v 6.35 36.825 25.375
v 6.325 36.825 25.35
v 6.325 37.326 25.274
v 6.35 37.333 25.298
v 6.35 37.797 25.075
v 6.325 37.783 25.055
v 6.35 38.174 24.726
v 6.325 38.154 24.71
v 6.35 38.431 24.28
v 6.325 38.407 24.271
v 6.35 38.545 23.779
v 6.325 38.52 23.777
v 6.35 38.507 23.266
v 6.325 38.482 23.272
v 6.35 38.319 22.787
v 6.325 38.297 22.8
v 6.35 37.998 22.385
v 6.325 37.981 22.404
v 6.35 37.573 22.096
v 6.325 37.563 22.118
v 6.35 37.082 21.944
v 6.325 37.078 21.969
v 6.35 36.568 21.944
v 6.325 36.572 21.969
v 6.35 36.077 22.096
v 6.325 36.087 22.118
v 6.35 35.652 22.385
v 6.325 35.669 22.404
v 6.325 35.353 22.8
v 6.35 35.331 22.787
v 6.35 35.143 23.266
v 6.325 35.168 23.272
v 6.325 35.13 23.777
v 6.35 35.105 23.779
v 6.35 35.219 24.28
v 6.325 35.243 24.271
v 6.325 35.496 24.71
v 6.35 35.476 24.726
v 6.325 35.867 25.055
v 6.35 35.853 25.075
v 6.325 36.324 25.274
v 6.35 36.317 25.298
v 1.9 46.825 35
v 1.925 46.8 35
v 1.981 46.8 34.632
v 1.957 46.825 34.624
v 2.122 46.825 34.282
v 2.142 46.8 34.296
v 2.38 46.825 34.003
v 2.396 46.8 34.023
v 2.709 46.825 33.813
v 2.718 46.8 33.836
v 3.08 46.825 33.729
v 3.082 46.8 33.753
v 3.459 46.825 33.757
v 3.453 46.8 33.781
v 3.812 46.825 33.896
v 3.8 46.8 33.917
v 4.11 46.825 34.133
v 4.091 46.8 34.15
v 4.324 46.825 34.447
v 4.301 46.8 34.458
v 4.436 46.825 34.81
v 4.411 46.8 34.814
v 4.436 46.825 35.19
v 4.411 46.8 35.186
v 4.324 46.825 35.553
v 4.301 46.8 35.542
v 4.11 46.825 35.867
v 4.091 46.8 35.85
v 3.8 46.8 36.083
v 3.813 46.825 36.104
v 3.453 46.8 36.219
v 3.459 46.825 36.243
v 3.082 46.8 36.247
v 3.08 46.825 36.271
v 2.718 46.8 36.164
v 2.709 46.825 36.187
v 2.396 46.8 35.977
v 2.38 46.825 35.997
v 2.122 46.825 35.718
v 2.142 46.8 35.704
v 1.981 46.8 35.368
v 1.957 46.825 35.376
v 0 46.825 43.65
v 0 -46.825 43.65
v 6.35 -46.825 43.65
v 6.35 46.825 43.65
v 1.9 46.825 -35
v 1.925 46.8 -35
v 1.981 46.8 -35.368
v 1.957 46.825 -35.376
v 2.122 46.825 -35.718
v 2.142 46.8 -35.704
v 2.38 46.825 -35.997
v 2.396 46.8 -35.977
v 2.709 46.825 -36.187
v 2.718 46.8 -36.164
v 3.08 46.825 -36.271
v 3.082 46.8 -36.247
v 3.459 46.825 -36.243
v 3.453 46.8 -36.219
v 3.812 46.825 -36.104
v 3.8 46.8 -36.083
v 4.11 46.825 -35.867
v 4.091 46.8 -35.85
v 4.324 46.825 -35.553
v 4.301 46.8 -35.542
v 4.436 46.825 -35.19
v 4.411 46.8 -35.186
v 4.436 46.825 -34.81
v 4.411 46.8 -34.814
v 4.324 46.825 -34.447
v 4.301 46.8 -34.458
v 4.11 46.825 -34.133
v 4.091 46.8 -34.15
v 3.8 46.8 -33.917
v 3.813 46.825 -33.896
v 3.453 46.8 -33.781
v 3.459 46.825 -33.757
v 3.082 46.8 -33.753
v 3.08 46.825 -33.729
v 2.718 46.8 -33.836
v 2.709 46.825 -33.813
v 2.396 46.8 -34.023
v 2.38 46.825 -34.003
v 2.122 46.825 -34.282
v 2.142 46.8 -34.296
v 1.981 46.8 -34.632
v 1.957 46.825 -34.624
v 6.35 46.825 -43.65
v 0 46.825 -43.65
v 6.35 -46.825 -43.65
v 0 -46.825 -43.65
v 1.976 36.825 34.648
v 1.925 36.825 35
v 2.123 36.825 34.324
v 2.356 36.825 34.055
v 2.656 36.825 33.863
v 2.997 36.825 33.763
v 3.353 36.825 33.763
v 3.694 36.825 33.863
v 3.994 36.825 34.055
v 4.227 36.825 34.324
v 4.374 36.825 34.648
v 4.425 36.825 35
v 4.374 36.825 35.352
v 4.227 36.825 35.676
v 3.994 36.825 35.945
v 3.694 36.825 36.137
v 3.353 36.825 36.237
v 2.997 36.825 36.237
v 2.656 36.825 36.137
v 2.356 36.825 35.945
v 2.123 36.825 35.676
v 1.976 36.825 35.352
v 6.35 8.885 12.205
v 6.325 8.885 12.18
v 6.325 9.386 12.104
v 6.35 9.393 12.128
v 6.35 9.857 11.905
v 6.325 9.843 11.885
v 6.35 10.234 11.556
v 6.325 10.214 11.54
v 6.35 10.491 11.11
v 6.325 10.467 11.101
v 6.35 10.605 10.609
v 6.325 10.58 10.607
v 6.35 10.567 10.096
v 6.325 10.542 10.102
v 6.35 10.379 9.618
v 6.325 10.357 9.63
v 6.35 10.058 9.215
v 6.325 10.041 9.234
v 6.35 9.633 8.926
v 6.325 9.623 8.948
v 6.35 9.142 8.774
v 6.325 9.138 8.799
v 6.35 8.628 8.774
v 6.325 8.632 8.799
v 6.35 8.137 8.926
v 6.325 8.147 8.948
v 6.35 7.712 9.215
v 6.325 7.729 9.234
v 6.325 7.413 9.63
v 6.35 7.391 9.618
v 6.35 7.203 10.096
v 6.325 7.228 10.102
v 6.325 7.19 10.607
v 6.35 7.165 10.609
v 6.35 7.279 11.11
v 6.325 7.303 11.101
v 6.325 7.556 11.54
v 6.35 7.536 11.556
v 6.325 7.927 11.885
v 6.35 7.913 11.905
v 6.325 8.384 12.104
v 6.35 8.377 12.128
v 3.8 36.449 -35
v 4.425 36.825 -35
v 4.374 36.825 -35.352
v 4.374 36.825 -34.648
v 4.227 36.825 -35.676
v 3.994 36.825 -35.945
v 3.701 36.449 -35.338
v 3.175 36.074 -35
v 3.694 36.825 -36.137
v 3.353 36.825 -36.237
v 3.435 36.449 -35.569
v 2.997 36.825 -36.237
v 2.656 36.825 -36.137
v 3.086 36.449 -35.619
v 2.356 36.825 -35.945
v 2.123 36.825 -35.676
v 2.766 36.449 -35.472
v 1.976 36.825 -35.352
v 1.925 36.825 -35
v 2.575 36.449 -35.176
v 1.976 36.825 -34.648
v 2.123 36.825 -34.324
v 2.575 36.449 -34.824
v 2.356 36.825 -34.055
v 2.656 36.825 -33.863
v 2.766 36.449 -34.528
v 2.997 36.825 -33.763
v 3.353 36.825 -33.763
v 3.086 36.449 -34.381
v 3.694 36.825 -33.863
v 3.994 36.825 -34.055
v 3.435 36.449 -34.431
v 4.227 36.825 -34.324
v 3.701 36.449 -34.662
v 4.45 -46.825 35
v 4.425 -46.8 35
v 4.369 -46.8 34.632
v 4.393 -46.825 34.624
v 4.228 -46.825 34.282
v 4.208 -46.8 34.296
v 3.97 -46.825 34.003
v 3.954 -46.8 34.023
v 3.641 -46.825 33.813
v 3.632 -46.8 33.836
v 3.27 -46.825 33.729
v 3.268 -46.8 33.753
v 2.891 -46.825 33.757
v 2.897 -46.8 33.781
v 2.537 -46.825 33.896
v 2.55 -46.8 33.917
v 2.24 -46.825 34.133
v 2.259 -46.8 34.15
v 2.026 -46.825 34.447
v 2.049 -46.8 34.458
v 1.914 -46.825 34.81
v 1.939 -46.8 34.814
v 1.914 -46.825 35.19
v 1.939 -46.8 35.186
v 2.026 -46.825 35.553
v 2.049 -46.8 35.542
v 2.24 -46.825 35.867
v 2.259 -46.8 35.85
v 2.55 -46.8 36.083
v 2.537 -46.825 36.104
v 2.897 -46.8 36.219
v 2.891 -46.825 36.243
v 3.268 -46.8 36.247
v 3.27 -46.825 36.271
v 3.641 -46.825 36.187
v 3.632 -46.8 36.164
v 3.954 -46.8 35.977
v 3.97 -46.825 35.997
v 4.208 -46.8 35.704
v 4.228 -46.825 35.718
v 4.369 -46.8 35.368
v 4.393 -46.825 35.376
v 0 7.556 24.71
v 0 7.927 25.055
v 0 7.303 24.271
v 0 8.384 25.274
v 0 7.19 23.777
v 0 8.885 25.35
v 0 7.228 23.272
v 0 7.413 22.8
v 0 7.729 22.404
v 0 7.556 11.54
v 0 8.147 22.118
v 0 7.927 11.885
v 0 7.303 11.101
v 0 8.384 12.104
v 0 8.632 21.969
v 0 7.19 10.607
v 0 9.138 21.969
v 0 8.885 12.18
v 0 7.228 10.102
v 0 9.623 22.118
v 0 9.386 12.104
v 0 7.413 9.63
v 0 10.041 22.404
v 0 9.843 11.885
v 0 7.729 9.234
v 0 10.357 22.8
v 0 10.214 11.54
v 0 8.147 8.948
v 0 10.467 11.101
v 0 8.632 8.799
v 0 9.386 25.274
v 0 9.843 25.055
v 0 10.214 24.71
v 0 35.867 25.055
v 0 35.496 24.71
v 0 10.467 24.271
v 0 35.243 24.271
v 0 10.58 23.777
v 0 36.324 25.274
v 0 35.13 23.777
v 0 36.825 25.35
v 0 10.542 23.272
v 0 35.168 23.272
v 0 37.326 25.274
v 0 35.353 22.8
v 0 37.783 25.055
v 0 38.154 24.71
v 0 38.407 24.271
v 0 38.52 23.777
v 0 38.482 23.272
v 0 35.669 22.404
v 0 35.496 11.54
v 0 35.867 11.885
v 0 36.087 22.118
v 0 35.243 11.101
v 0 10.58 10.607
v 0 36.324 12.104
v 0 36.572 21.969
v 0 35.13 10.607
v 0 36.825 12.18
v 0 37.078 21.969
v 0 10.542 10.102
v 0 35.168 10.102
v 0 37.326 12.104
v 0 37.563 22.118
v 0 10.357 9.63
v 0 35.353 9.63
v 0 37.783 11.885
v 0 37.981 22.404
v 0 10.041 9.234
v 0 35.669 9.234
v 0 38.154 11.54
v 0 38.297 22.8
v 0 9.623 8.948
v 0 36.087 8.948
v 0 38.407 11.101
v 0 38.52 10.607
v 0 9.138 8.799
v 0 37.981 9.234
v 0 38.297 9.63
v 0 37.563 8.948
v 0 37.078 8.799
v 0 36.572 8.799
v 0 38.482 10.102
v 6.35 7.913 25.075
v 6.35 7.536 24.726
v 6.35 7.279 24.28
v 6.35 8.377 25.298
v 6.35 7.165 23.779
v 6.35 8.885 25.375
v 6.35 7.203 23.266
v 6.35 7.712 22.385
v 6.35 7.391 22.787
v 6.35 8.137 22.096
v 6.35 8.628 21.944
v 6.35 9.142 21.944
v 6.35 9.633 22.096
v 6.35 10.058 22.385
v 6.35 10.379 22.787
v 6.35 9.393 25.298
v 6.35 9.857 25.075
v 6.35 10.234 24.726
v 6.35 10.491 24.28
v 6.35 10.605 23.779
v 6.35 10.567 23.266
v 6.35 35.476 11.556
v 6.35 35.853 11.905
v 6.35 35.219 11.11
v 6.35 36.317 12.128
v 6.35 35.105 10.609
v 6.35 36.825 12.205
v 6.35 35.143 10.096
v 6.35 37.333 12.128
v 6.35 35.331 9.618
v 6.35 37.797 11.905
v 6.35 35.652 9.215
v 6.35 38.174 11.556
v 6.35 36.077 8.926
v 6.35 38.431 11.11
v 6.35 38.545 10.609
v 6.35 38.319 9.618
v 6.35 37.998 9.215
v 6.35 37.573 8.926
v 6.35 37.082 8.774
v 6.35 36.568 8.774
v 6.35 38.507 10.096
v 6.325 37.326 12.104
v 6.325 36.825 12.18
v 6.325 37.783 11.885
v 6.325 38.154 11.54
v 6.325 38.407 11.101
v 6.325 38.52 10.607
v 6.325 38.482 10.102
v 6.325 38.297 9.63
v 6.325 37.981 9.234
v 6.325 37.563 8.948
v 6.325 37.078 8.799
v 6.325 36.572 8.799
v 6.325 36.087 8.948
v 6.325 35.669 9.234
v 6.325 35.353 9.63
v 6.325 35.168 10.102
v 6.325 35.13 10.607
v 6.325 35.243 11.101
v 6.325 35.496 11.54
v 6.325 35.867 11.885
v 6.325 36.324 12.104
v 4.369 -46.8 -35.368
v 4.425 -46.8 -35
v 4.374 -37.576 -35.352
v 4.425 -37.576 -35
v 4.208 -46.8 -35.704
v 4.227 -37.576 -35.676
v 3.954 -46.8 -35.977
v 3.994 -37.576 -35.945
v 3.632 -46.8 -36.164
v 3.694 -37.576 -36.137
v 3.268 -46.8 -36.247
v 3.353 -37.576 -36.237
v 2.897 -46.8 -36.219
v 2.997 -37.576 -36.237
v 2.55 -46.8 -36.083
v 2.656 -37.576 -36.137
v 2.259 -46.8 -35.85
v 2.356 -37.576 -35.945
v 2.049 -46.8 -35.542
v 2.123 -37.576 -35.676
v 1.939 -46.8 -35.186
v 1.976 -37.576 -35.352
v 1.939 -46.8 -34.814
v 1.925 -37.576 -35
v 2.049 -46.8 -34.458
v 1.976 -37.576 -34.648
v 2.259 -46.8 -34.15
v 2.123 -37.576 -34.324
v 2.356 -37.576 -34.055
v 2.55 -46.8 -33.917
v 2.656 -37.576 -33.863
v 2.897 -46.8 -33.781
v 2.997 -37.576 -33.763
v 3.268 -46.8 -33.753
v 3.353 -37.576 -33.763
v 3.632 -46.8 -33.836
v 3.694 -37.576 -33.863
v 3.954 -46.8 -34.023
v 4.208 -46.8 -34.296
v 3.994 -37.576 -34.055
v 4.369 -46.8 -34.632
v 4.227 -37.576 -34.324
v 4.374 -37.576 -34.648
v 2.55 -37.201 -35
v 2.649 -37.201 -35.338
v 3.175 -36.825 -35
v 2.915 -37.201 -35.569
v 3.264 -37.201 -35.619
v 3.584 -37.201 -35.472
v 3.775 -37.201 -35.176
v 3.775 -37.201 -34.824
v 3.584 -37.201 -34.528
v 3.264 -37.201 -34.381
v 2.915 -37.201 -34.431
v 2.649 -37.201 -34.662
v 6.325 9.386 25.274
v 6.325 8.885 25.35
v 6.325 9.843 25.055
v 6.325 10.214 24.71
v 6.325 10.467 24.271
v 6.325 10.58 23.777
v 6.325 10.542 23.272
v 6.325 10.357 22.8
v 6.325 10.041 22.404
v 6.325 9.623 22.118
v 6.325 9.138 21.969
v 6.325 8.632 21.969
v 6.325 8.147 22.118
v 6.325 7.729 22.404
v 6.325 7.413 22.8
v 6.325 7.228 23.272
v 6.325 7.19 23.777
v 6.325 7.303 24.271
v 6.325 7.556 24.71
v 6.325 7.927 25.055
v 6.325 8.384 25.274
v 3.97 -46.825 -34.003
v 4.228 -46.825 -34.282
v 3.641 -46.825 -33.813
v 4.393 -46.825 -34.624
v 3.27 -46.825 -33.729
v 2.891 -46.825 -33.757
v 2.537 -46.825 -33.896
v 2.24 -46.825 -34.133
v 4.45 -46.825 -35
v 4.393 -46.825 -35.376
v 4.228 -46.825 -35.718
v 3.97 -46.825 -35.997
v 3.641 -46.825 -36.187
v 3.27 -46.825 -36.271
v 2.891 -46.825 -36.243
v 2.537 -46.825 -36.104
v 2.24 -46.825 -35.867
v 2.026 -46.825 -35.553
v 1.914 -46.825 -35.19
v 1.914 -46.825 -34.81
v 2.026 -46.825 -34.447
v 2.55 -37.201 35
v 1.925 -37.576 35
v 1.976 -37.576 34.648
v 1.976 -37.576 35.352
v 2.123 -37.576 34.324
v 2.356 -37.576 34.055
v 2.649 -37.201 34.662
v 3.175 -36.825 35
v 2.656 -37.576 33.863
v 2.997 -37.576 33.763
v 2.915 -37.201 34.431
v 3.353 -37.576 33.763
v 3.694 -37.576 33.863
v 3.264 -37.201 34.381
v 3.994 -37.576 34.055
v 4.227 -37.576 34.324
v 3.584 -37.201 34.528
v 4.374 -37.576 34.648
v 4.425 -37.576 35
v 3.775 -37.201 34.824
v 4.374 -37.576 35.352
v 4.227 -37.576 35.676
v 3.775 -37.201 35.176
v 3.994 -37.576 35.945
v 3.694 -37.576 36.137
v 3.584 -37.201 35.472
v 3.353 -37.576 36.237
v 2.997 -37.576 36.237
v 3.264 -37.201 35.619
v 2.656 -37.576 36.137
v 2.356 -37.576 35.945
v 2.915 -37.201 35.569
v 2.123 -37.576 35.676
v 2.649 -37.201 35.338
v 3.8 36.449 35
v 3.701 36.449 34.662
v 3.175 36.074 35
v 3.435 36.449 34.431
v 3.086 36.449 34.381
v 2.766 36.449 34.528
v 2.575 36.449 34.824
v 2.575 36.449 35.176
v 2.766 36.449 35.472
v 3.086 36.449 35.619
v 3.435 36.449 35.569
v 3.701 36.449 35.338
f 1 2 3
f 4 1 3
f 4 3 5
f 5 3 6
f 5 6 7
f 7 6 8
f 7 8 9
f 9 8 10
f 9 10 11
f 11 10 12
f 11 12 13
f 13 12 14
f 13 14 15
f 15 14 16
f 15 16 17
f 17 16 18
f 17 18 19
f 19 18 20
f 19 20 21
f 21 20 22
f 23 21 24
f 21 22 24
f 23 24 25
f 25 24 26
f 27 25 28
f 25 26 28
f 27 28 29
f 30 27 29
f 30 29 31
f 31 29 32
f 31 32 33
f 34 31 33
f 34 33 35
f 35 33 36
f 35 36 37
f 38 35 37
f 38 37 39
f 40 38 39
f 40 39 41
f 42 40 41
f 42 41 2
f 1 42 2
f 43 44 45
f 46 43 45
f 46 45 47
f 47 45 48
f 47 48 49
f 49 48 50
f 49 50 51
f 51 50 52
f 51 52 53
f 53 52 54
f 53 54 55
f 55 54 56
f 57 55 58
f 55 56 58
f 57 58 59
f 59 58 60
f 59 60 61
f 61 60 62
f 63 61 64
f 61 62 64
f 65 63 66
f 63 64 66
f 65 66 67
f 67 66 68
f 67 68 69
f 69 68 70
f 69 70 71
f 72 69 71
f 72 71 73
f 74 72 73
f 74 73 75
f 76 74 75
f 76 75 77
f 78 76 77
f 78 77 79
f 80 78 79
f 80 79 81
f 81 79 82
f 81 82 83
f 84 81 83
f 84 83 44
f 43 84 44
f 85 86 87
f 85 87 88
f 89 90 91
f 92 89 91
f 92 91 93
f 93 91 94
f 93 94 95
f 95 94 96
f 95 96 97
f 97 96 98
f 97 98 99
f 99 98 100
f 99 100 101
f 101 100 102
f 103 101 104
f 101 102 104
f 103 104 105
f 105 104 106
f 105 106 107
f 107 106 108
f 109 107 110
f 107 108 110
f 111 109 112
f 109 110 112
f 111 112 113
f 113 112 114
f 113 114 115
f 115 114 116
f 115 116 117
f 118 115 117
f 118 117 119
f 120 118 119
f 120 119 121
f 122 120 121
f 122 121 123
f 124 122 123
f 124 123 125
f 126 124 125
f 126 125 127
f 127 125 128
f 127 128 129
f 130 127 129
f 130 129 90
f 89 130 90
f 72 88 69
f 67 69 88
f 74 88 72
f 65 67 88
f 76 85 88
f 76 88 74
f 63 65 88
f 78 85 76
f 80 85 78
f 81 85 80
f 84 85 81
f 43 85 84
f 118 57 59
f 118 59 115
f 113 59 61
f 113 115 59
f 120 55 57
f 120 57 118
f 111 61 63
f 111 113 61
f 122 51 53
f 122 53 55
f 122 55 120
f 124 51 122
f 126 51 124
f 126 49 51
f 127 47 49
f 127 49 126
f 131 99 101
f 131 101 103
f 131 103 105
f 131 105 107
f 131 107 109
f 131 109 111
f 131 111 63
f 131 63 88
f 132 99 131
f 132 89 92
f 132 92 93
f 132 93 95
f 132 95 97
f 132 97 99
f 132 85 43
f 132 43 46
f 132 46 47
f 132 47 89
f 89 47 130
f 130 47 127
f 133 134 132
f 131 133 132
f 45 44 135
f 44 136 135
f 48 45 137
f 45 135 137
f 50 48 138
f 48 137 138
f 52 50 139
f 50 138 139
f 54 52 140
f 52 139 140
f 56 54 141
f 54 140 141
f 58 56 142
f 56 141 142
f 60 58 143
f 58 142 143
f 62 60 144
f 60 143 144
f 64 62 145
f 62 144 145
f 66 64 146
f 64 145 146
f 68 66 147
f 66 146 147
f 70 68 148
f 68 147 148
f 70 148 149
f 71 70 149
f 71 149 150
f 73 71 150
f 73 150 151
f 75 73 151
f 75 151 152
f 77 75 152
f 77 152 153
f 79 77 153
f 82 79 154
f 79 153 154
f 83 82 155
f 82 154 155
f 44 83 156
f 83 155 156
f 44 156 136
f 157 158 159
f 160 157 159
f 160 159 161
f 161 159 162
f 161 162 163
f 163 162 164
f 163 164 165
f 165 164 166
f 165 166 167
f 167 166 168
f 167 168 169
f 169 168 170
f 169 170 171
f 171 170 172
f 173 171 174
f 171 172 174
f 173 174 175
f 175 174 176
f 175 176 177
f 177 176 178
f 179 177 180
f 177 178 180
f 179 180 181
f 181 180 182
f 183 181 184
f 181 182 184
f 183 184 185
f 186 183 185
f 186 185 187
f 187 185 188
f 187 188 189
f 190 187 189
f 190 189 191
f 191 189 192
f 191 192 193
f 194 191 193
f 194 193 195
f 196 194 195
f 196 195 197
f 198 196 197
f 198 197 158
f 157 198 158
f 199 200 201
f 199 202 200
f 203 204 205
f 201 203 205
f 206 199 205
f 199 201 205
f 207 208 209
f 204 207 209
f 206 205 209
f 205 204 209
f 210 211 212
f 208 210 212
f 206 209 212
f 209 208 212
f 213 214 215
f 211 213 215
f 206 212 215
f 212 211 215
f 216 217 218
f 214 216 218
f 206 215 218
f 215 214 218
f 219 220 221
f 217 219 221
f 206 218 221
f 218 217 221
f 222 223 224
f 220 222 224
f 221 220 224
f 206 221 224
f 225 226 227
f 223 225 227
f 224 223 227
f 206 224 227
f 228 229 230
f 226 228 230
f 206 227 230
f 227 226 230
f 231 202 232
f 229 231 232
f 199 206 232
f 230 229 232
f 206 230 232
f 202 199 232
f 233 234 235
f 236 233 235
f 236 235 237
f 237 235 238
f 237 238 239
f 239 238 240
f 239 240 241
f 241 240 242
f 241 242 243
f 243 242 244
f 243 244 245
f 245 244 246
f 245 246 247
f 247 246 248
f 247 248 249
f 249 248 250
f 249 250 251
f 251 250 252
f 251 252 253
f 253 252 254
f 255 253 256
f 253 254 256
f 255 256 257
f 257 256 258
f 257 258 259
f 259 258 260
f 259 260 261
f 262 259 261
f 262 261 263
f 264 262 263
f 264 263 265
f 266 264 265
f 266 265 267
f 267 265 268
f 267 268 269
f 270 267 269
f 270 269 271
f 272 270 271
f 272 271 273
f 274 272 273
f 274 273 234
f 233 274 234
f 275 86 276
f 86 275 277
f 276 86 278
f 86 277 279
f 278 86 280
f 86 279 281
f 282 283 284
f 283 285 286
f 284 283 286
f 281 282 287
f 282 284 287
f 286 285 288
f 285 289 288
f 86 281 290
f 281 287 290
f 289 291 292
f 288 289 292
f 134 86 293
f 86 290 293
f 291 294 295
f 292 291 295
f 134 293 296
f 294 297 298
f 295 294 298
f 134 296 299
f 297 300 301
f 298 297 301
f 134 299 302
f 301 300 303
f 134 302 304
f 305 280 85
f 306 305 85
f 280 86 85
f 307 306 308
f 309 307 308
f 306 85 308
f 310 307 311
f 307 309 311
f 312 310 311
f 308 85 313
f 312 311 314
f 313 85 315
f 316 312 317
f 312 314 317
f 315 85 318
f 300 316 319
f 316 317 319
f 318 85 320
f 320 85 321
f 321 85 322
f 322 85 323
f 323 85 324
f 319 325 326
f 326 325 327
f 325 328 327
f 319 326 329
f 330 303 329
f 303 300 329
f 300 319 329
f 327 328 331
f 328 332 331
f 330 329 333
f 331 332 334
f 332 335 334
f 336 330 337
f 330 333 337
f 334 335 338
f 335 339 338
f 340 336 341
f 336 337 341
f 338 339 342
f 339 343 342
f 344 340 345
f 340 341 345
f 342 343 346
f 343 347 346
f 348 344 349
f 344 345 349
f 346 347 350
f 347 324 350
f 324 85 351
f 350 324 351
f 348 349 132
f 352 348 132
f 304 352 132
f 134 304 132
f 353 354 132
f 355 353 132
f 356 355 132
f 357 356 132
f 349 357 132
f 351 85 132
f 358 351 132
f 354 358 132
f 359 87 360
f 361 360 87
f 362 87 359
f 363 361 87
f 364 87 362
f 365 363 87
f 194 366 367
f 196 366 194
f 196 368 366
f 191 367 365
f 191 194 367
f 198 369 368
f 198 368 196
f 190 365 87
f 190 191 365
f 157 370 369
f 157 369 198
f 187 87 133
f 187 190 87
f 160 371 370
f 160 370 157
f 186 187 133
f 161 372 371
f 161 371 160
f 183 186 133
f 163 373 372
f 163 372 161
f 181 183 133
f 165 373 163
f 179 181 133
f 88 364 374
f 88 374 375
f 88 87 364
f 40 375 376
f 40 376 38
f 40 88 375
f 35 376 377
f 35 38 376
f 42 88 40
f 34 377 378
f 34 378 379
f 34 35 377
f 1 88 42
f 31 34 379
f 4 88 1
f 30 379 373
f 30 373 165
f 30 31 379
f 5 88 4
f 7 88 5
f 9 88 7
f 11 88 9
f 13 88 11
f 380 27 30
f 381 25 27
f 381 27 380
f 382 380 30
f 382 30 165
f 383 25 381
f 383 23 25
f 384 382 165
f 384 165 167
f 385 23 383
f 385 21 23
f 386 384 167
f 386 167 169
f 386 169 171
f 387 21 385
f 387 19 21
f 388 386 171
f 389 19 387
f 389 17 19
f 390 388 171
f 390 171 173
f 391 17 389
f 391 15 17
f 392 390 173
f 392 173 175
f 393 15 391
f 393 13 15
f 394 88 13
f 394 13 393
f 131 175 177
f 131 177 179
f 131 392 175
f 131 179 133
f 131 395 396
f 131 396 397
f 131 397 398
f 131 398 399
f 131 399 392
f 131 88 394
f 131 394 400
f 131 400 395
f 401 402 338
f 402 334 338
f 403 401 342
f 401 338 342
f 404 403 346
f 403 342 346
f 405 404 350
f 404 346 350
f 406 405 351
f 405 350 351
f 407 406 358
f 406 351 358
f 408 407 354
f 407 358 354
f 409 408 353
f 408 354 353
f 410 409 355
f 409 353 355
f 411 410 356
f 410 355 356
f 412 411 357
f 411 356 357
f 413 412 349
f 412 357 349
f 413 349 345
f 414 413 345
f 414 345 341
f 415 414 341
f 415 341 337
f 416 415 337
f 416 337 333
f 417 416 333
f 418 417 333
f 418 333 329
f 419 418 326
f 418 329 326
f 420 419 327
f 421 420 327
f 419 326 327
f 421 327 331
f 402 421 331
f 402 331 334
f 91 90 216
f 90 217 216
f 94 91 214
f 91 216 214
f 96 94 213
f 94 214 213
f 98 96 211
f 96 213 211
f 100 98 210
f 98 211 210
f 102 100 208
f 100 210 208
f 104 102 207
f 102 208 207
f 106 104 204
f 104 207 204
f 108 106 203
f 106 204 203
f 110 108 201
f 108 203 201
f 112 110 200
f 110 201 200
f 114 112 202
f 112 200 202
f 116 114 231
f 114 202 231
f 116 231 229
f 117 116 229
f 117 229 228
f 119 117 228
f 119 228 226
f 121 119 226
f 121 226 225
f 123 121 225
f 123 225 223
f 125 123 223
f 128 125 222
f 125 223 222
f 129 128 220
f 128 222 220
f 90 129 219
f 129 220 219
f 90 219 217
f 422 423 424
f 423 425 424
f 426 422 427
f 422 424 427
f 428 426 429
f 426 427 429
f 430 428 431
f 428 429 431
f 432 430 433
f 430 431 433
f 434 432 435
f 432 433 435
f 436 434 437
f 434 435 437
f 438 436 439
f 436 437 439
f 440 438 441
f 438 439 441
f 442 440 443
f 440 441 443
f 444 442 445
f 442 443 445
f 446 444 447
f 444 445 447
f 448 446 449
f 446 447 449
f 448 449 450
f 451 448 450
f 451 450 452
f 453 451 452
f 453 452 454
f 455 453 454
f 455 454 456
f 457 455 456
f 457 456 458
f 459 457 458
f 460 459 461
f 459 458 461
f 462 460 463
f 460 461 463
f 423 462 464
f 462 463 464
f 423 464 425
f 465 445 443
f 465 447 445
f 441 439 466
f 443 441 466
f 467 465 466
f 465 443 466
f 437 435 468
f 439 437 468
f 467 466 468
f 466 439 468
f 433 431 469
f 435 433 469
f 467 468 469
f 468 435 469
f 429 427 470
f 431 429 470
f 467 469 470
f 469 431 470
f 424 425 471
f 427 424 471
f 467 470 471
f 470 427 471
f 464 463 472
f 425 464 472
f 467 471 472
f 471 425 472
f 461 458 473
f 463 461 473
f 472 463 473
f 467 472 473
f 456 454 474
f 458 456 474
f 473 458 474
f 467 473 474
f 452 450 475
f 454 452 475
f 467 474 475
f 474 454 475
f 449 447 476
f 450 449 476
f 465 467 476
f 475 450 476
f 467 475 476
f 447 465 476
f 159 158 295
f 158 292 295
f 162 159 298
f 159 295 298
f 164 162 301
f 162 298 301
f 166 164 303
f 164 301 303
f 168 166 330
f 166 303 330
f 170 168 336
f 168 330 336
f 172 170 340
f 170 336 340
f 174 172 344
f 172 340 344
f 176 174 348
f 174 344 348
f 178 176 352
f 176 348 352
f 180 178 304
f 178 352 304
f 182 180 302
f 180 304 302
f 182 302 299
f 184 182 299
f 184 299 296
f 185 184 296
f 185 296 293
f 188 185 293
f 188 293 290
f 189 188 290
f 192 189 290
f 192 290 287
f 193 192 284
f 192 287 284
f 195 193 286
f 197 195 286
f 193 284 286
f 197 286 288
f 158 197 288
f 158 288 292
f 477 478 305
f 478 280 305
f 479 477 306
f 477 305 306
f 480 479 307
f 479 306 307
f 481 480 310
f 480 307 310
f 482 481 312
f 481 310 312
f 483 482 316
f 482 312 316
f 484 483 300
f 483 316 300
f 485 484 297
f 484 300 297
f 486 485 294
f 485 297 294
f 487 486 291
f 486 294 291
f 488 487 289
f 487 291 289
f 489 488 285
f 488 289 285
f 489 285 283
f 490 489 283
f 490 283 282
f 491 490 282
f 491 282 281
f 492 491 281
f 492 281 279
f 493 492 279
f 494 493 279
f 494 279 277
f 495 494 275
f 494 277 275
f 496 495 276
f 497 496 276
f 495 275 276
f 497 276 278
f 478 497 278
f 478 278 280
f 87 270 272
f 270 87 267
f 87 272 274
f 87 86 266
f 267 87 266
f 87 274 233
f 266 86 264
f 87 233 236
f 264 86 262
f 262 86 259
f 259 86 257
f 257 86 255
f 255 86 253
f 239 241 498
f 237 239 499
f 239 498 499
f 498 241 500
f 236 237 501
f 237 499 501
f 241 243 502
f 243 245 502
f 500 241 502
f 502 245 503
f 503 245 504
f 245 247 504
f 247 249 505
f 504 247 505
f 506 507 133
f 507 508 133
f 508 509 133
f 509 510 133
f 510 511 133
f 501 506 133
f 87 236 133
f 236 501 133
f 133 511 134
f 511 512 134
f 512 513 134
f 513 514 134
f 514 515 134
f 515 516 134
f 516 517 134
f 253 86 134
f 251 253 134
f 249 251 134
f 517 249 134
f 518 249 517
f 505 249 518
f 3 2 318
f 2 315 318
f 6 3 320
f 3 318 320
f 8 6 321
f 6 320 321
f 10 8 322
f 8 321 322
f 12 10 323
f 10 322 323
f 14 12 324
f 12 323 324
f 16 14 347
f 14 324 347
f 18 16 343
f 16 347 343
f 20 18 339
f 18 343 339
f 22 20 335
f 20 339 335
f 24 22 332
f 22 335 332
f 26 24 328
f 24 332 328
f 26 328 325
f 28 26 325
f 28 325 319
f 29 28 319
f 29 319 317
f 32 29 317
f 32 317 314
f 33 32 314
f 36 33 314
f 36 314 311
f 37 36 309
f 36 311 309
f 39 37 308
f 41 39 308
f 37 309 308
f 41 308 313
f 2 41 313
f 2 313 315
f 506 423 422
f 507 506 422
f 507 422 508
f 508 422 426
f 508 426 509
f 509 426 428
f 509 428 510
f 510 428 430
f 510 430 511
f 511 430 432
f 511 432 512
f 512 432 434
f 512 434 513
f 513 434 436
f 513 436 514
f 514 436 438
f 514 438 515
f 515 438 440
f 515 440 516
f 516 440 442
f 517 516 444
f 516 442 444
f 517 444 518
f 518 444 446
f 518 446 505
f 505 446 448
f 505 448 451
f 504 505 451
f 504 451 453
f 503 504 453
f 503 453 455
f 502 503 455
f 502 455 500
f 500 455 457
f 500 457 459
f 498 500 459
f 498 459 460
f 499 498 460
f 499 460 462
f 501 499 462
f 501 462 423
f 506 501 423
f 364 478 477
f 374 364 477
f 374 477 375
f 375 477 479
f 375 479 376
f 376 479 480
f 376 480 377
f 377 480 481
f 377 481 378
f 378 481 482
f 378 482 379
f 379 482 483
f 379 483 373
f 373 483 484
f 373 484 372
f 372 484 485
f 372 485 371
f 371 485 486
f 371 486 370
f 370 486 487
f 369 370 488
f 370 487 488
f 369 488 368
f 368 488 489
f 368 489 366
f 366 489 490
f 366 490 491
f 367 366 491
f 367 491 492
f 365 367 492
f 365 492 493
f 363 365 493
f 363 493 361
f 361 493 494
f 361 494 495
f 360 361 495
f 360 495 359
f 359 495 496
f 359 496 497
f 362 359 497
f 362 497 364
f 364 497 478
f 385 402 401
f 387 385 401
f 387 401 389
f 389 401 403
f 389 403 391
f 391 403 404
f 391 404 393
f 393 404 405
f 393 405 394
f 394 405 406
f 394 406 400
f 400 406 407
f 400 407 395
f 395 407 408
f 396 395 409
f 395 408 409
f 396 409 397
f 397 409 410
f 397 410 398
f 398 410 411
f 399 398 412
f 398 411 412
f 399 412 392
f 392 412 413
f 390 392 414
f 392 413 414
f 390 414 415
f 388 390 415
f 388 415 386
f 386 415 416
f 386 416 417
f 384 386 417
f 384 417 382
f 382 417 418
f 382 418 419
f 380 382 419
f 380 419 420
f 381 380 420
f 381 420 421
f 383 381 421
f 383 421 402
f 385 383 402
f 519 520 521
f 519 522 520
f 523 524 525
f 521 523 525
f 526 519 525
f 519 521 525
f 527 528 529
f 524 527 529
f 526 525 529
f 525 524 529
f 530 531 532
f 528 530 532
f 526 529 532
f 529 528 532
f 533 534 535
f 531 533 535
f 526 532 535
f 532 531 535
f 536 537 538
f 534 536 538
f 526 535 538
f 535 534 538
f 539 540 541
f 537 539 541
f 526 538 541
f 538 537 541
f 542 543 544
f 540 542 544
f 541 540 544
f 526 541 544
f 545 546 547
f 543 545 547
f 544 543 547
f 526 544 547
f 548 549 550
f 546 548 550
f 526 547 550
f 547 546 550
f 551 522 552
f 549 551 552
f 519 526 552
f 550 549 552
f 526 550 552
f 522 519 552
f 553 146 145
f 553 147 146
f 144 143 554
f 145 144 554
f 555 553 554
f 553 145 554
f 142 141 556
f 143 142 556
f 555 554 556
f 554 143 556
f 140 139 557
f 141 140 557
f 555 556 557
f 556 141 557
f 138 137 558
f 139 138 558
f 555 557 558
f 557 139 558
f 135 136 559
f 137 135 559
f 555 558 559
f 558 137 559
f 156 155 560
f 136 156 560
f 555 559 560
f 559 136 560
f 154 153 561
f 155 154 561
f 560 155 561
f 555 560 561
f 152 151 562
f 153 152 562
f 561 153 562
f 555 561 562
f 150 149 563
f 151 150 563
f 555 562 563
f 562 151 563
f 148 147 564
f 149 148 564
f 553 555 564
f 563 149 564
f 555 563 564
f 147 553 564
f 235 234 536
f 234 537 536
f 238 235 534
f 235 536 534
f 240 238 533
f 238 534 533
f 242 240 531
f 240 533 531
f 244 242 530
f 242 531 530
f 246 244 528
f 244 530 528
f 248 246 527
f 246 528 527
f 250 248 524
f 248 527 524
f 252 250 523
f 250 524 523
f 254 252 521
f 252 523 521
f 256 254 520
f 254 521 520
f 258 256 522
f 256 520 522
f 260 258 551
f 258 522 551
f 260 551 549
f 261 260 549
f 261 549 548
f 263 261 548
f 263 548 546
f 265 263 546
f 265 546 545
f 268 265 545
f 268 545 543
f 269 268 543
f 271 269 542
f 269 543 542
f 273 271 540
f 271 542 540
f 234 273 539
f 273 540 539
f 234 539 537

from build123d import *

# Parameters (mm, degrees)
SKETCH1_W                             = 87.3
SKETCH1_H                             = 93.65
BOSS_EXTRUDE1_DEPTH                   = 6.35
TAP_DRILL_FOR_M3X0_5_TAP1_D           = 2.5
TAP_DRILL_FOR_M3X0_5_TAP1_DEPTH       = 10
TAP_DRILL_FOR_M3X0_5_TAP1_CSINK_D     = 2.55
TAP_DRILL_FOR_M3X0_5_TAP1_CSINK_ANGLE = 90
TAP_DRILL_FOR_M3X0_5_TAP1_TIP         = 0.751075774
TAP_DRILL_FOR_M3X0_5_TAP2_D           = 2.5
TAP_DRILL_FOR_M3X0_5_TAP2_DEPTH       = 9.248924226
TAP_DRILL_FOR_M3X0_5_TAP2_CSINK_D     = 2.55
TAP_DRILL_FOR_M3X0_5_TAP2_CSINK_ANGLE = 90
TAP_DRILL_FOR_M3X0_5_TAP2_TIP         = 0.751075774
M3_CLEARANCE_HOLE2_D                  = 3.4
M3_CLEARANCE_HOLE2_CSINK_D            = 3.45
M3_CLEARANCE_HOLE2_CSINK_ANGLE        = 90


with BuildPart() as part:
    # Sketch1 → Boss-Extrude1 (new body)
    with BuildSketch(Plane(origin=(0, 0, 0), x_dir=(0, 0, -1), z_dir=(1, 0, 0))):
        Rectangle(SKETCH1_W, SKETCH1_H)
    extrude(amount=BOSS_EXTRUDE1_DEPTH)

    # Tap Drill for M3x0.5 Tap1
    with Locations(Plane(origin=(0, 46.825, 0), x_dir=(1, 0, 0), z_dir=(0, 1, 0))):
        with Locations((3.175, 35), (3.175, -35)):
            CounterSinkHole(TAP_DRILL_FOR_M3X0_5_TAP1_D / 2, TAP_DRILL_FOR_M3X0_5_TAP1_CSINK_D / 2, depth=TAP_DRILL_FOR_M3X0_5_TAP1_DEPTH, counter_sink_angle=TAP_DRILL_FOR_M3X0_5_TAP1_CSINK_ANGLE)
            with Locations((0, 0, -(TAP_DRILL_FOR_M3X0_5_TAP1_DEPTH + TAP_DRILL_FOR_M3X0_5_TAP1_TIP / 2))):  # 118° drill point
                Cone(0, TAP_DRILL_FOR_M3X0_5_TAP1_D / 2, TAP_DRILL_FOR_M3X0_5_TAP1_TIP, mode=Mode.SUBTRACT)

    # Tap Drill for M3x0.5 Tap2
    with Locations(Plane(origin=(0, -46.825, 0), x_dir=(-1, 0, 0), z_dir=(0, -1, 0))):
        with Locations((-3.175, -35), (-3.175, 35)):
            CounterSinkHole(TAP_DRILL_FOR_M3X0_5_TAP2_D / 2, TAP_DRILL_FOR_M3X0_5_TAP2_CSINK_D / 2, depth=TAP_DRILL_FOR_M3X0_5_TAP2_DEPTH, counter_sink_angle=TAP_DRILL_FOR_M3X0_5_TAP2_CSINK_ANGLE)
            with Locations((0, 0, -(TAP_DRILL_FOR_M3X0_5_TAP2_DEPTH + TAP_DRILL_FOR_M3X0_5_TAP2_TIP / 2))):  # 118° drill point
                Cone(0, TAP_DRILL_FOR_M3X0_5_TAP2_D / 2, TAP_DRILL_FOR_M3X0_5_TAP2_TIP, mode=Mode.SUBTRACT)

    # M3 Clearance Hole2 (through all)
    with Locations(Plane(origin=(6.35, 0, 0), x_dir=(0, 0, -1), z_dir=(1, 0, 0))):
        with Locations((-23.65, 36.825), (-10.48, 36.825), (-10.48, 8.885), (-23.65, 8.885)):
            CounterSinkHole(M3_CLEARANCE_HOLE2_D / 2, M3_CLEARANCE_HOLE2_CSINK_D / 2, counter_sink_angle=M3_CLEARANCE_HOLE2_CSINK_ANGLE)


solid = part.part
